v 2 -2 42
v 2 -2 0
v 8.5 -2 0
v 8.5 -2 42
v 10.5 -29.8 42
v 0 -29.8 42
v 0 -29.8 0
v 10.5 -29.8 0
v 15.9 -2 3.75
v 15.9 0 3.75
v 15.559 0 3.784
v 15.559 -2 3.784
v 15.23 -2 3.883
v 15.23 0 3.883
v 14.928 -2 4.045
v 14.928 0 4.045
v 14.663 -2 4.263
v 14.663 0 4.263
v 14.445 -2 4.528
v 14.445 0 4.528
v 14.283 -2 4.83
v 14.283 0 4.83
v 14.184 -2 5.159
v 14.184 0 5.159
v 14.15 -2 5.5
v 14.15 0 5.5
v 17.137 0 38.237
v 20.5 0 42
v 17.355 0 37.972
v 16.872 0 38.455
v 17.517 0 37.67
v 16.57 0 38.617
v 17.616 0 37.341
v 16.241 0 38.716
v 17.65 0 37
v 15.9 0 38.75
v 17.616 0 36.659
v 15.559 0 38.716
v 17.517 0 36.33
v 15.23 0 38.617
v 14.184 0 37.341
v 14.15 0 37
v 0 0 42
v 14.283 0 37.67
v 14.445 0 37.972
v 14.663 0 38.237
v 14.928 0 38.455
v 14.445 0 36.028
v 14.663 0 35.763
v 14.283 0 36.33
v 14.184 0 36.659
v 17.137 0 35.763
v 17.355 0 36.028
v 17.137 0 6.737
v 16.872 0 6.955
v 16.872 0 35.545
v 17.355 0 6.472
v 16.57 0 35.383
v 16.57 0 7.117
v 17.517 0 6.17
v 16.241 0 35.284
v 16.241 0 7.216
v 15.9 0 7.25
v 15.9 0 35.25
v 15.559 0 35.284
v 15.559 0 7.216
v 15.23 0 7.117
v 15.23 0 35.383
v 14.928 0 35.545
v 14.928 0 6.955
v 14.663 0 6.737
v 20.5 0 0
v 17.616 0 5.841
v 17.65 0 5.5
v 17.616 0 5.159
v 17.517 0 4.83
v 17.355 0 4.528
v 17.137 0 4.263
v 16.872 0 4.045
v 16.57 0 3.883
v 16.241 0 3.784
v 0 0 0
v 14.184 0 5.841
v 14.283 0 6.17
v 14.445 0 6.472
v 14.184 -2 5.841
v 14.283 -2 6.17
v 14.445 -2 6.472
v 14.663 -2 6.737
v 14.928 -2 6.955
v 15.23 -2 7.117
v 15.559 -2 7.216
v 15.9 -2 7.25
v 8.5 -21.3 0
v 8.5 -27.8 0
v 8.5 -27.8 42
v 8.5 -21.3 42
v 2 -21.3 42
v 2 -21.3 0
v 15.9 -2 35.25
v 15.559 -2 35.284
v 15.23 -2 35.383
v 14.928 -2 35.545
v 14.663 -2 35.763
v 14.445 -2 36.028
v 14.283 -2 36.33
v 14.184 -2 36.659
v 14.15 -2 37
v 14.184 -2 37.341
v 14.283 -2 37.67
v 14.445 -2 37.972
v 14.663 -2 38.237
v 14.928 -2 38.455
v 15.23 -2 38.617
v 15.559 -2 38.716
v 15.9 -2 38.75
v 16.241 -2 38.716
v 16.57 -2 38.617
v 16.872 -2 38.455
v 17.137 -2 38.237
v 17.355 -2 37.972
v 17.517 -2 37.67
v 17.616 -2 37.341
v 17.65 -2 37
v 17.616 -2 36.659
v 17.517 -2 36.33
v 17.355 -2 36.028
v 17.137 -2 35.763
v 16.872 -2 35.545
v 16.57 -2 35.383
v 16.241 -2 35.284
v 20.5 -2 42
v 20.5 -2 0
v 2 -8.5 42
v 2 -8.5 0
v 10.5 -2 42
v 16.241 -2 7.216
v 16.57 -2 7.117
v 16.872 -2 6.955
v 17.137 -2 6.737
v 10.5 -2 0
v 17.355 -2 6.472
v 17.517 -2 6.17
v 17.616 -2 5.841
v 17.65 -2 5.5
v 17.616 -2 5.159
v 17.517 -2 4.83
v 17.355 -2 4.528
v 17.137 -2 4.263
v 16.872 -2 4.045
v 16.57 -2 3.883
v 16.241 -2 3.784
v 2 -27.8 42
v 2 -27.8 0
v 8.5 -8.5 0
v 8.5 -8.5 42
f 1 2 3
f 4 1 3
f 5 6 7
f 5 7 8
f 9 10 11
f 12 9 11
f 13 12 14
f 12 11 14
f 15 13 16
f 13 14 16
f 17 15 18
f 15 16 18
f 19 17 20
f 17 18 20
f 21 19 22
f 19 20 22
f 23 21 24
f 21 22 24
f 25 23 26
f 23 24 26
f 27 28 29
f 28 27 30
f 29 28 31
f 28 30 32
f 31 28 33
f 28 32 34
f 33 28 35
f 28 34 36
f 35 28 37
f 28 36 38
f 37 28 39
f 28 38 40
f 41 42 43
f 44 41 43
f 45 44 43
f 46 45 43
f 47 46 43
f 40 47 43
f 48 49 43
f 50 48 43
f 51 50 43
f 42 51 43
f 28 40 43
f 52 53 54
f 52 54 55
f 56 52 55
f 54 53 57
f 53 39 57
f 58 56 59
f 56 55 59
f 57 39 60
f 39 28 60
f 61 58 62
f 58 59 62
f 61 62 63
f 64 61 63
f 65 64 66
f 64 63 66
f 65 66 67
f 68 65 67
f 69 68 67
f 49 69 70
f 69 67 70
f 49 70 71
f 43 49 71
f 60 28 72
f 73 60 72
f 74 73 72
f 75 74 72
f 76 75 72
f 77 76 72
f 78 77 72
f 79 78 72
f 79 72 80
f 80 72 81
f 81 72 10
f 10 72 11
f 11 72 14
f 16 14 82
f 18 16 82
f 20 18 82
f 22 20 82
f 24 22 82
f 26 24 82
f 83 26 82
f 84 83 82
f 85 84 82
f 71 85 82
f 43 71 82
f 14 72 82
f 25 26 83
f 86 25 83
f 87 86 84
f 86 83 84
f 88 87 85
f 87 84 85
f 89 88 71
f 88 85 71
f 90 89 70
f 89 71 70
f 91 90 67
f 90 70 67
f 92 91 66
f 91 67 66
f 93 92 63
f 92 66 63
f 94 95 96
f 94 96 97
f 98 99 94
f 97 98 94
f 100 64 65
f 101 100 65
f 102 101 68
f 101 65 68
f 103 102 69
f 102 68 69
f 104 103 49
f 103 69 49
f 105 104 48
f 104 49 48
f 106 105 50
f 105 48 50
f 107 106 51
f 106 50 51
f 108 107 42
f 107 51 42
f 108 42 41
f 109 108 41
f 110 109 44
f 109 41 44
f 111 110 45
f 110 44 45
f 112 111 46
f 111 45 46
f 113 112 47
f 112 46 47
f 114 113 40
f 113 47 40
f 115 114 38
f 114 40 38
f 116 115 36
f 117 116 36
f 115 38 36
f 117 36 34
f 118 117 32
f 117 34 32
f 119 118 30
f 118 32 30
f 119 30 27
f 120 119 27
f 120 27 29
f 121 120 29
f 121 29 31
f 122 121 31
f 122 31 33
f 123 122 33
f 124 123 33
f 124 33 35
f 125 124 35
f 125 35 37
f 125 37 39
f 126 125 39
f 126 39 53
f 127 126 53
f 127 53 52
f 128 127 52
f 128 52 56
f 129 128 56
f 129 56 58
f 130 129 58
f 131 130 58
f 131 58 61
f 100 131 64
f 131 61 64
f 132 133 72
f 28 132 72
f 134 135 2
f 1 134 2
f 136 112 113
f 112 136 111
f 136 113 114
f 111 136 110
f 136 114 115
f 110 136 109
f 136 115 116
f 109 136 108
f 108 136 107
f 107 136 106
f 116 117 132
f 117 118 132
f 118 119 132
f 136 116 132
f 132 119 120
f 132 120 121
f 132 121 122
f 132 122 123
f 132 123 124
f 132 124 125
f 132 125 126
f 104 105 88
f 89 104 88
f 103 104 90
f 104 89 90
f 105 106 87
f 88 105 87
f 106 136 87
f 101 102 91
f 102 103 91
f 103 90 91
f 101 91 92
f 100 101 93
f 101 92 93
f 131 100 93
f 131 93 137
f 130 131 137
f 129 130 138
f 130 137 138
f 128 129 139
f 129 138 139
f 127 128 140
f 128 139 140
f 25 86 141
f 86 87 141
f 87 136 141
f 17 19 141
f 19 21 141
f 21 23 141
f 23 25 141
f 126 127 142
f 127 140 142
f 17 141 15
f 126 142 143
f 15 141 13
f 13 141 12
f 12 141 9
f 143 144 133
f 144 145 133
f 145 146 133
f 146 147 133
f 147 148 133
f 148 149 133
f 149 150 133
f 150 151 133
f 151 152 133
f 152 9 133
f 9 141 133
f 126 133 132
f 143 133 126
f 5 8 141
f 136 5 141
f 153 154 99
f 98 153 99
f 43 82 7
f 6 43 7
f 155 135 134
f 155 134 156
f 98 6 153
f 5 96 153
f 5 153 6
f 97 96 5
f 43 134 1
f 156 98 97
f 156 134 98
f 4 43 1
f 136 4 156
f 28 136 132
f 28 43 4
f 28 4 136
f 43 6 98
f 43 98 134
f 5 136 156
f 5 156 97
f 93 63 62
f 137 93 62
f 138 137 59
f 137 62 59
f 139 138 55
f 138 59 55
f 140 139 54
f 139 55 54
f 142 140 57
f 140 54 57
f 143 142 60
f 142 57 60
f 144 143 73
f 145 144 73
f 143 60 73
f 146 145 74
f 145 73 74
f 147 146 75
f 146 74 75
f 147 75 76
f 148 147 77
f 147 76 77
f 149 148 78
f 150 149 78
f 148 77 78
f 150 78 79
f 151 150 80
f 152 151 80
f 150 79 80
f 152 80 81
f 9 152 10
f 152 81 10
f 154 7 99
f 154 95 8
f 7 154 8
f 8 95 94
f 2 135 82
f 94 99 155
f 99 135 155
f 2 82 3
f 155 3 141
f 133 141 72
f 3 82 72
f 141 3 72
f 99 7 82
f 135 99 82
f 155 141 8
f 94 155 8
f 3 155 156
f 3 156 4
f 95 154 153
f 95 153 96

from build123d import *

# Parameters (mm, degrees)
F0_W     = 6.5
F0_H     = 6.5
F1_DEPTH = 42
F3_DEPTH = 29.801


with BuildPart() as f1:
    # F0 (on Top) → F1 (new body)
    with BuildSketch(Plane.XY):
        Polygon((20.5, 0), (0, 0), (0, -29.8), (10.5, -29.8), (10.5, -2), (20.5, -2), align=None)
        with Locations((5.25, -24.55)):
            Rectangle(F0_W, F0_H, mode=Mode.SUBTRACT)
        with Locations((5.25, -5.25)):
            Rectangle(F0_W, F0_H, mode=Mode.SUBTRACT)
    extrude(amount=F1_DEPTH)

    # F2 (on face) → F3 (cut, through all)
    with BuildSketch(Plane(origin=(0, 0, 0), x_dir=(-1, 0, 0), z_dir=(0, 1, 0))):
        with BuildLine():
            Line((-15.9, 5.5), (-14.15, 5.5))
            ThreePointArc((-14.15, 5.5), (-14.6625631329, 6.7374368671), (-15.9, 7.25))
            Line((-15.9, 7.25), (-15.9, 5.5))
        make_face()
        with BuildLine():
            Line((-15.9, 5.5), (-15.9, 3.75))
            ThreePointArc((-15.9, 3.75), (-14.6625631329, 4.2625631329), (-14.15, 5.5))
            Line((-14.15, 5.5), (-15.9, 5.5))
        make_face()
        with BuildLine():
            ThreePointArc((-15.9, 7.25), (-17.65, 5.5), (-15.9, 3.75))
            Line((-15.9, 3.75), (-15.9, 5.5))
            Line((-15.9, 5.5), (-15.9, 7.25))
        make_face()
        with BuildLine():
            ThreePointArc((-15.9, 35.25), (-14.6625631329, 35.7625631329), (-14.15, 37))
            Line((-14.15, 37), (-15.9, 37))
            Line((-15.9, 37), (-15.9, 35.25))
        make_face()
        with BuildLine():
            Line((-15.9, 37), (-14.15, 37))
            ThreePointArc((-14.15, 37), (-17.1374368671, 38.2374368671), (-15.9, 35.25))
            Line((-15.9, 35.25), (-15.9, 37))
        make_face()
    extrude(amount=-F3_DEPTH, mode=Mode.SUBTRACT)


solid = f1.part
